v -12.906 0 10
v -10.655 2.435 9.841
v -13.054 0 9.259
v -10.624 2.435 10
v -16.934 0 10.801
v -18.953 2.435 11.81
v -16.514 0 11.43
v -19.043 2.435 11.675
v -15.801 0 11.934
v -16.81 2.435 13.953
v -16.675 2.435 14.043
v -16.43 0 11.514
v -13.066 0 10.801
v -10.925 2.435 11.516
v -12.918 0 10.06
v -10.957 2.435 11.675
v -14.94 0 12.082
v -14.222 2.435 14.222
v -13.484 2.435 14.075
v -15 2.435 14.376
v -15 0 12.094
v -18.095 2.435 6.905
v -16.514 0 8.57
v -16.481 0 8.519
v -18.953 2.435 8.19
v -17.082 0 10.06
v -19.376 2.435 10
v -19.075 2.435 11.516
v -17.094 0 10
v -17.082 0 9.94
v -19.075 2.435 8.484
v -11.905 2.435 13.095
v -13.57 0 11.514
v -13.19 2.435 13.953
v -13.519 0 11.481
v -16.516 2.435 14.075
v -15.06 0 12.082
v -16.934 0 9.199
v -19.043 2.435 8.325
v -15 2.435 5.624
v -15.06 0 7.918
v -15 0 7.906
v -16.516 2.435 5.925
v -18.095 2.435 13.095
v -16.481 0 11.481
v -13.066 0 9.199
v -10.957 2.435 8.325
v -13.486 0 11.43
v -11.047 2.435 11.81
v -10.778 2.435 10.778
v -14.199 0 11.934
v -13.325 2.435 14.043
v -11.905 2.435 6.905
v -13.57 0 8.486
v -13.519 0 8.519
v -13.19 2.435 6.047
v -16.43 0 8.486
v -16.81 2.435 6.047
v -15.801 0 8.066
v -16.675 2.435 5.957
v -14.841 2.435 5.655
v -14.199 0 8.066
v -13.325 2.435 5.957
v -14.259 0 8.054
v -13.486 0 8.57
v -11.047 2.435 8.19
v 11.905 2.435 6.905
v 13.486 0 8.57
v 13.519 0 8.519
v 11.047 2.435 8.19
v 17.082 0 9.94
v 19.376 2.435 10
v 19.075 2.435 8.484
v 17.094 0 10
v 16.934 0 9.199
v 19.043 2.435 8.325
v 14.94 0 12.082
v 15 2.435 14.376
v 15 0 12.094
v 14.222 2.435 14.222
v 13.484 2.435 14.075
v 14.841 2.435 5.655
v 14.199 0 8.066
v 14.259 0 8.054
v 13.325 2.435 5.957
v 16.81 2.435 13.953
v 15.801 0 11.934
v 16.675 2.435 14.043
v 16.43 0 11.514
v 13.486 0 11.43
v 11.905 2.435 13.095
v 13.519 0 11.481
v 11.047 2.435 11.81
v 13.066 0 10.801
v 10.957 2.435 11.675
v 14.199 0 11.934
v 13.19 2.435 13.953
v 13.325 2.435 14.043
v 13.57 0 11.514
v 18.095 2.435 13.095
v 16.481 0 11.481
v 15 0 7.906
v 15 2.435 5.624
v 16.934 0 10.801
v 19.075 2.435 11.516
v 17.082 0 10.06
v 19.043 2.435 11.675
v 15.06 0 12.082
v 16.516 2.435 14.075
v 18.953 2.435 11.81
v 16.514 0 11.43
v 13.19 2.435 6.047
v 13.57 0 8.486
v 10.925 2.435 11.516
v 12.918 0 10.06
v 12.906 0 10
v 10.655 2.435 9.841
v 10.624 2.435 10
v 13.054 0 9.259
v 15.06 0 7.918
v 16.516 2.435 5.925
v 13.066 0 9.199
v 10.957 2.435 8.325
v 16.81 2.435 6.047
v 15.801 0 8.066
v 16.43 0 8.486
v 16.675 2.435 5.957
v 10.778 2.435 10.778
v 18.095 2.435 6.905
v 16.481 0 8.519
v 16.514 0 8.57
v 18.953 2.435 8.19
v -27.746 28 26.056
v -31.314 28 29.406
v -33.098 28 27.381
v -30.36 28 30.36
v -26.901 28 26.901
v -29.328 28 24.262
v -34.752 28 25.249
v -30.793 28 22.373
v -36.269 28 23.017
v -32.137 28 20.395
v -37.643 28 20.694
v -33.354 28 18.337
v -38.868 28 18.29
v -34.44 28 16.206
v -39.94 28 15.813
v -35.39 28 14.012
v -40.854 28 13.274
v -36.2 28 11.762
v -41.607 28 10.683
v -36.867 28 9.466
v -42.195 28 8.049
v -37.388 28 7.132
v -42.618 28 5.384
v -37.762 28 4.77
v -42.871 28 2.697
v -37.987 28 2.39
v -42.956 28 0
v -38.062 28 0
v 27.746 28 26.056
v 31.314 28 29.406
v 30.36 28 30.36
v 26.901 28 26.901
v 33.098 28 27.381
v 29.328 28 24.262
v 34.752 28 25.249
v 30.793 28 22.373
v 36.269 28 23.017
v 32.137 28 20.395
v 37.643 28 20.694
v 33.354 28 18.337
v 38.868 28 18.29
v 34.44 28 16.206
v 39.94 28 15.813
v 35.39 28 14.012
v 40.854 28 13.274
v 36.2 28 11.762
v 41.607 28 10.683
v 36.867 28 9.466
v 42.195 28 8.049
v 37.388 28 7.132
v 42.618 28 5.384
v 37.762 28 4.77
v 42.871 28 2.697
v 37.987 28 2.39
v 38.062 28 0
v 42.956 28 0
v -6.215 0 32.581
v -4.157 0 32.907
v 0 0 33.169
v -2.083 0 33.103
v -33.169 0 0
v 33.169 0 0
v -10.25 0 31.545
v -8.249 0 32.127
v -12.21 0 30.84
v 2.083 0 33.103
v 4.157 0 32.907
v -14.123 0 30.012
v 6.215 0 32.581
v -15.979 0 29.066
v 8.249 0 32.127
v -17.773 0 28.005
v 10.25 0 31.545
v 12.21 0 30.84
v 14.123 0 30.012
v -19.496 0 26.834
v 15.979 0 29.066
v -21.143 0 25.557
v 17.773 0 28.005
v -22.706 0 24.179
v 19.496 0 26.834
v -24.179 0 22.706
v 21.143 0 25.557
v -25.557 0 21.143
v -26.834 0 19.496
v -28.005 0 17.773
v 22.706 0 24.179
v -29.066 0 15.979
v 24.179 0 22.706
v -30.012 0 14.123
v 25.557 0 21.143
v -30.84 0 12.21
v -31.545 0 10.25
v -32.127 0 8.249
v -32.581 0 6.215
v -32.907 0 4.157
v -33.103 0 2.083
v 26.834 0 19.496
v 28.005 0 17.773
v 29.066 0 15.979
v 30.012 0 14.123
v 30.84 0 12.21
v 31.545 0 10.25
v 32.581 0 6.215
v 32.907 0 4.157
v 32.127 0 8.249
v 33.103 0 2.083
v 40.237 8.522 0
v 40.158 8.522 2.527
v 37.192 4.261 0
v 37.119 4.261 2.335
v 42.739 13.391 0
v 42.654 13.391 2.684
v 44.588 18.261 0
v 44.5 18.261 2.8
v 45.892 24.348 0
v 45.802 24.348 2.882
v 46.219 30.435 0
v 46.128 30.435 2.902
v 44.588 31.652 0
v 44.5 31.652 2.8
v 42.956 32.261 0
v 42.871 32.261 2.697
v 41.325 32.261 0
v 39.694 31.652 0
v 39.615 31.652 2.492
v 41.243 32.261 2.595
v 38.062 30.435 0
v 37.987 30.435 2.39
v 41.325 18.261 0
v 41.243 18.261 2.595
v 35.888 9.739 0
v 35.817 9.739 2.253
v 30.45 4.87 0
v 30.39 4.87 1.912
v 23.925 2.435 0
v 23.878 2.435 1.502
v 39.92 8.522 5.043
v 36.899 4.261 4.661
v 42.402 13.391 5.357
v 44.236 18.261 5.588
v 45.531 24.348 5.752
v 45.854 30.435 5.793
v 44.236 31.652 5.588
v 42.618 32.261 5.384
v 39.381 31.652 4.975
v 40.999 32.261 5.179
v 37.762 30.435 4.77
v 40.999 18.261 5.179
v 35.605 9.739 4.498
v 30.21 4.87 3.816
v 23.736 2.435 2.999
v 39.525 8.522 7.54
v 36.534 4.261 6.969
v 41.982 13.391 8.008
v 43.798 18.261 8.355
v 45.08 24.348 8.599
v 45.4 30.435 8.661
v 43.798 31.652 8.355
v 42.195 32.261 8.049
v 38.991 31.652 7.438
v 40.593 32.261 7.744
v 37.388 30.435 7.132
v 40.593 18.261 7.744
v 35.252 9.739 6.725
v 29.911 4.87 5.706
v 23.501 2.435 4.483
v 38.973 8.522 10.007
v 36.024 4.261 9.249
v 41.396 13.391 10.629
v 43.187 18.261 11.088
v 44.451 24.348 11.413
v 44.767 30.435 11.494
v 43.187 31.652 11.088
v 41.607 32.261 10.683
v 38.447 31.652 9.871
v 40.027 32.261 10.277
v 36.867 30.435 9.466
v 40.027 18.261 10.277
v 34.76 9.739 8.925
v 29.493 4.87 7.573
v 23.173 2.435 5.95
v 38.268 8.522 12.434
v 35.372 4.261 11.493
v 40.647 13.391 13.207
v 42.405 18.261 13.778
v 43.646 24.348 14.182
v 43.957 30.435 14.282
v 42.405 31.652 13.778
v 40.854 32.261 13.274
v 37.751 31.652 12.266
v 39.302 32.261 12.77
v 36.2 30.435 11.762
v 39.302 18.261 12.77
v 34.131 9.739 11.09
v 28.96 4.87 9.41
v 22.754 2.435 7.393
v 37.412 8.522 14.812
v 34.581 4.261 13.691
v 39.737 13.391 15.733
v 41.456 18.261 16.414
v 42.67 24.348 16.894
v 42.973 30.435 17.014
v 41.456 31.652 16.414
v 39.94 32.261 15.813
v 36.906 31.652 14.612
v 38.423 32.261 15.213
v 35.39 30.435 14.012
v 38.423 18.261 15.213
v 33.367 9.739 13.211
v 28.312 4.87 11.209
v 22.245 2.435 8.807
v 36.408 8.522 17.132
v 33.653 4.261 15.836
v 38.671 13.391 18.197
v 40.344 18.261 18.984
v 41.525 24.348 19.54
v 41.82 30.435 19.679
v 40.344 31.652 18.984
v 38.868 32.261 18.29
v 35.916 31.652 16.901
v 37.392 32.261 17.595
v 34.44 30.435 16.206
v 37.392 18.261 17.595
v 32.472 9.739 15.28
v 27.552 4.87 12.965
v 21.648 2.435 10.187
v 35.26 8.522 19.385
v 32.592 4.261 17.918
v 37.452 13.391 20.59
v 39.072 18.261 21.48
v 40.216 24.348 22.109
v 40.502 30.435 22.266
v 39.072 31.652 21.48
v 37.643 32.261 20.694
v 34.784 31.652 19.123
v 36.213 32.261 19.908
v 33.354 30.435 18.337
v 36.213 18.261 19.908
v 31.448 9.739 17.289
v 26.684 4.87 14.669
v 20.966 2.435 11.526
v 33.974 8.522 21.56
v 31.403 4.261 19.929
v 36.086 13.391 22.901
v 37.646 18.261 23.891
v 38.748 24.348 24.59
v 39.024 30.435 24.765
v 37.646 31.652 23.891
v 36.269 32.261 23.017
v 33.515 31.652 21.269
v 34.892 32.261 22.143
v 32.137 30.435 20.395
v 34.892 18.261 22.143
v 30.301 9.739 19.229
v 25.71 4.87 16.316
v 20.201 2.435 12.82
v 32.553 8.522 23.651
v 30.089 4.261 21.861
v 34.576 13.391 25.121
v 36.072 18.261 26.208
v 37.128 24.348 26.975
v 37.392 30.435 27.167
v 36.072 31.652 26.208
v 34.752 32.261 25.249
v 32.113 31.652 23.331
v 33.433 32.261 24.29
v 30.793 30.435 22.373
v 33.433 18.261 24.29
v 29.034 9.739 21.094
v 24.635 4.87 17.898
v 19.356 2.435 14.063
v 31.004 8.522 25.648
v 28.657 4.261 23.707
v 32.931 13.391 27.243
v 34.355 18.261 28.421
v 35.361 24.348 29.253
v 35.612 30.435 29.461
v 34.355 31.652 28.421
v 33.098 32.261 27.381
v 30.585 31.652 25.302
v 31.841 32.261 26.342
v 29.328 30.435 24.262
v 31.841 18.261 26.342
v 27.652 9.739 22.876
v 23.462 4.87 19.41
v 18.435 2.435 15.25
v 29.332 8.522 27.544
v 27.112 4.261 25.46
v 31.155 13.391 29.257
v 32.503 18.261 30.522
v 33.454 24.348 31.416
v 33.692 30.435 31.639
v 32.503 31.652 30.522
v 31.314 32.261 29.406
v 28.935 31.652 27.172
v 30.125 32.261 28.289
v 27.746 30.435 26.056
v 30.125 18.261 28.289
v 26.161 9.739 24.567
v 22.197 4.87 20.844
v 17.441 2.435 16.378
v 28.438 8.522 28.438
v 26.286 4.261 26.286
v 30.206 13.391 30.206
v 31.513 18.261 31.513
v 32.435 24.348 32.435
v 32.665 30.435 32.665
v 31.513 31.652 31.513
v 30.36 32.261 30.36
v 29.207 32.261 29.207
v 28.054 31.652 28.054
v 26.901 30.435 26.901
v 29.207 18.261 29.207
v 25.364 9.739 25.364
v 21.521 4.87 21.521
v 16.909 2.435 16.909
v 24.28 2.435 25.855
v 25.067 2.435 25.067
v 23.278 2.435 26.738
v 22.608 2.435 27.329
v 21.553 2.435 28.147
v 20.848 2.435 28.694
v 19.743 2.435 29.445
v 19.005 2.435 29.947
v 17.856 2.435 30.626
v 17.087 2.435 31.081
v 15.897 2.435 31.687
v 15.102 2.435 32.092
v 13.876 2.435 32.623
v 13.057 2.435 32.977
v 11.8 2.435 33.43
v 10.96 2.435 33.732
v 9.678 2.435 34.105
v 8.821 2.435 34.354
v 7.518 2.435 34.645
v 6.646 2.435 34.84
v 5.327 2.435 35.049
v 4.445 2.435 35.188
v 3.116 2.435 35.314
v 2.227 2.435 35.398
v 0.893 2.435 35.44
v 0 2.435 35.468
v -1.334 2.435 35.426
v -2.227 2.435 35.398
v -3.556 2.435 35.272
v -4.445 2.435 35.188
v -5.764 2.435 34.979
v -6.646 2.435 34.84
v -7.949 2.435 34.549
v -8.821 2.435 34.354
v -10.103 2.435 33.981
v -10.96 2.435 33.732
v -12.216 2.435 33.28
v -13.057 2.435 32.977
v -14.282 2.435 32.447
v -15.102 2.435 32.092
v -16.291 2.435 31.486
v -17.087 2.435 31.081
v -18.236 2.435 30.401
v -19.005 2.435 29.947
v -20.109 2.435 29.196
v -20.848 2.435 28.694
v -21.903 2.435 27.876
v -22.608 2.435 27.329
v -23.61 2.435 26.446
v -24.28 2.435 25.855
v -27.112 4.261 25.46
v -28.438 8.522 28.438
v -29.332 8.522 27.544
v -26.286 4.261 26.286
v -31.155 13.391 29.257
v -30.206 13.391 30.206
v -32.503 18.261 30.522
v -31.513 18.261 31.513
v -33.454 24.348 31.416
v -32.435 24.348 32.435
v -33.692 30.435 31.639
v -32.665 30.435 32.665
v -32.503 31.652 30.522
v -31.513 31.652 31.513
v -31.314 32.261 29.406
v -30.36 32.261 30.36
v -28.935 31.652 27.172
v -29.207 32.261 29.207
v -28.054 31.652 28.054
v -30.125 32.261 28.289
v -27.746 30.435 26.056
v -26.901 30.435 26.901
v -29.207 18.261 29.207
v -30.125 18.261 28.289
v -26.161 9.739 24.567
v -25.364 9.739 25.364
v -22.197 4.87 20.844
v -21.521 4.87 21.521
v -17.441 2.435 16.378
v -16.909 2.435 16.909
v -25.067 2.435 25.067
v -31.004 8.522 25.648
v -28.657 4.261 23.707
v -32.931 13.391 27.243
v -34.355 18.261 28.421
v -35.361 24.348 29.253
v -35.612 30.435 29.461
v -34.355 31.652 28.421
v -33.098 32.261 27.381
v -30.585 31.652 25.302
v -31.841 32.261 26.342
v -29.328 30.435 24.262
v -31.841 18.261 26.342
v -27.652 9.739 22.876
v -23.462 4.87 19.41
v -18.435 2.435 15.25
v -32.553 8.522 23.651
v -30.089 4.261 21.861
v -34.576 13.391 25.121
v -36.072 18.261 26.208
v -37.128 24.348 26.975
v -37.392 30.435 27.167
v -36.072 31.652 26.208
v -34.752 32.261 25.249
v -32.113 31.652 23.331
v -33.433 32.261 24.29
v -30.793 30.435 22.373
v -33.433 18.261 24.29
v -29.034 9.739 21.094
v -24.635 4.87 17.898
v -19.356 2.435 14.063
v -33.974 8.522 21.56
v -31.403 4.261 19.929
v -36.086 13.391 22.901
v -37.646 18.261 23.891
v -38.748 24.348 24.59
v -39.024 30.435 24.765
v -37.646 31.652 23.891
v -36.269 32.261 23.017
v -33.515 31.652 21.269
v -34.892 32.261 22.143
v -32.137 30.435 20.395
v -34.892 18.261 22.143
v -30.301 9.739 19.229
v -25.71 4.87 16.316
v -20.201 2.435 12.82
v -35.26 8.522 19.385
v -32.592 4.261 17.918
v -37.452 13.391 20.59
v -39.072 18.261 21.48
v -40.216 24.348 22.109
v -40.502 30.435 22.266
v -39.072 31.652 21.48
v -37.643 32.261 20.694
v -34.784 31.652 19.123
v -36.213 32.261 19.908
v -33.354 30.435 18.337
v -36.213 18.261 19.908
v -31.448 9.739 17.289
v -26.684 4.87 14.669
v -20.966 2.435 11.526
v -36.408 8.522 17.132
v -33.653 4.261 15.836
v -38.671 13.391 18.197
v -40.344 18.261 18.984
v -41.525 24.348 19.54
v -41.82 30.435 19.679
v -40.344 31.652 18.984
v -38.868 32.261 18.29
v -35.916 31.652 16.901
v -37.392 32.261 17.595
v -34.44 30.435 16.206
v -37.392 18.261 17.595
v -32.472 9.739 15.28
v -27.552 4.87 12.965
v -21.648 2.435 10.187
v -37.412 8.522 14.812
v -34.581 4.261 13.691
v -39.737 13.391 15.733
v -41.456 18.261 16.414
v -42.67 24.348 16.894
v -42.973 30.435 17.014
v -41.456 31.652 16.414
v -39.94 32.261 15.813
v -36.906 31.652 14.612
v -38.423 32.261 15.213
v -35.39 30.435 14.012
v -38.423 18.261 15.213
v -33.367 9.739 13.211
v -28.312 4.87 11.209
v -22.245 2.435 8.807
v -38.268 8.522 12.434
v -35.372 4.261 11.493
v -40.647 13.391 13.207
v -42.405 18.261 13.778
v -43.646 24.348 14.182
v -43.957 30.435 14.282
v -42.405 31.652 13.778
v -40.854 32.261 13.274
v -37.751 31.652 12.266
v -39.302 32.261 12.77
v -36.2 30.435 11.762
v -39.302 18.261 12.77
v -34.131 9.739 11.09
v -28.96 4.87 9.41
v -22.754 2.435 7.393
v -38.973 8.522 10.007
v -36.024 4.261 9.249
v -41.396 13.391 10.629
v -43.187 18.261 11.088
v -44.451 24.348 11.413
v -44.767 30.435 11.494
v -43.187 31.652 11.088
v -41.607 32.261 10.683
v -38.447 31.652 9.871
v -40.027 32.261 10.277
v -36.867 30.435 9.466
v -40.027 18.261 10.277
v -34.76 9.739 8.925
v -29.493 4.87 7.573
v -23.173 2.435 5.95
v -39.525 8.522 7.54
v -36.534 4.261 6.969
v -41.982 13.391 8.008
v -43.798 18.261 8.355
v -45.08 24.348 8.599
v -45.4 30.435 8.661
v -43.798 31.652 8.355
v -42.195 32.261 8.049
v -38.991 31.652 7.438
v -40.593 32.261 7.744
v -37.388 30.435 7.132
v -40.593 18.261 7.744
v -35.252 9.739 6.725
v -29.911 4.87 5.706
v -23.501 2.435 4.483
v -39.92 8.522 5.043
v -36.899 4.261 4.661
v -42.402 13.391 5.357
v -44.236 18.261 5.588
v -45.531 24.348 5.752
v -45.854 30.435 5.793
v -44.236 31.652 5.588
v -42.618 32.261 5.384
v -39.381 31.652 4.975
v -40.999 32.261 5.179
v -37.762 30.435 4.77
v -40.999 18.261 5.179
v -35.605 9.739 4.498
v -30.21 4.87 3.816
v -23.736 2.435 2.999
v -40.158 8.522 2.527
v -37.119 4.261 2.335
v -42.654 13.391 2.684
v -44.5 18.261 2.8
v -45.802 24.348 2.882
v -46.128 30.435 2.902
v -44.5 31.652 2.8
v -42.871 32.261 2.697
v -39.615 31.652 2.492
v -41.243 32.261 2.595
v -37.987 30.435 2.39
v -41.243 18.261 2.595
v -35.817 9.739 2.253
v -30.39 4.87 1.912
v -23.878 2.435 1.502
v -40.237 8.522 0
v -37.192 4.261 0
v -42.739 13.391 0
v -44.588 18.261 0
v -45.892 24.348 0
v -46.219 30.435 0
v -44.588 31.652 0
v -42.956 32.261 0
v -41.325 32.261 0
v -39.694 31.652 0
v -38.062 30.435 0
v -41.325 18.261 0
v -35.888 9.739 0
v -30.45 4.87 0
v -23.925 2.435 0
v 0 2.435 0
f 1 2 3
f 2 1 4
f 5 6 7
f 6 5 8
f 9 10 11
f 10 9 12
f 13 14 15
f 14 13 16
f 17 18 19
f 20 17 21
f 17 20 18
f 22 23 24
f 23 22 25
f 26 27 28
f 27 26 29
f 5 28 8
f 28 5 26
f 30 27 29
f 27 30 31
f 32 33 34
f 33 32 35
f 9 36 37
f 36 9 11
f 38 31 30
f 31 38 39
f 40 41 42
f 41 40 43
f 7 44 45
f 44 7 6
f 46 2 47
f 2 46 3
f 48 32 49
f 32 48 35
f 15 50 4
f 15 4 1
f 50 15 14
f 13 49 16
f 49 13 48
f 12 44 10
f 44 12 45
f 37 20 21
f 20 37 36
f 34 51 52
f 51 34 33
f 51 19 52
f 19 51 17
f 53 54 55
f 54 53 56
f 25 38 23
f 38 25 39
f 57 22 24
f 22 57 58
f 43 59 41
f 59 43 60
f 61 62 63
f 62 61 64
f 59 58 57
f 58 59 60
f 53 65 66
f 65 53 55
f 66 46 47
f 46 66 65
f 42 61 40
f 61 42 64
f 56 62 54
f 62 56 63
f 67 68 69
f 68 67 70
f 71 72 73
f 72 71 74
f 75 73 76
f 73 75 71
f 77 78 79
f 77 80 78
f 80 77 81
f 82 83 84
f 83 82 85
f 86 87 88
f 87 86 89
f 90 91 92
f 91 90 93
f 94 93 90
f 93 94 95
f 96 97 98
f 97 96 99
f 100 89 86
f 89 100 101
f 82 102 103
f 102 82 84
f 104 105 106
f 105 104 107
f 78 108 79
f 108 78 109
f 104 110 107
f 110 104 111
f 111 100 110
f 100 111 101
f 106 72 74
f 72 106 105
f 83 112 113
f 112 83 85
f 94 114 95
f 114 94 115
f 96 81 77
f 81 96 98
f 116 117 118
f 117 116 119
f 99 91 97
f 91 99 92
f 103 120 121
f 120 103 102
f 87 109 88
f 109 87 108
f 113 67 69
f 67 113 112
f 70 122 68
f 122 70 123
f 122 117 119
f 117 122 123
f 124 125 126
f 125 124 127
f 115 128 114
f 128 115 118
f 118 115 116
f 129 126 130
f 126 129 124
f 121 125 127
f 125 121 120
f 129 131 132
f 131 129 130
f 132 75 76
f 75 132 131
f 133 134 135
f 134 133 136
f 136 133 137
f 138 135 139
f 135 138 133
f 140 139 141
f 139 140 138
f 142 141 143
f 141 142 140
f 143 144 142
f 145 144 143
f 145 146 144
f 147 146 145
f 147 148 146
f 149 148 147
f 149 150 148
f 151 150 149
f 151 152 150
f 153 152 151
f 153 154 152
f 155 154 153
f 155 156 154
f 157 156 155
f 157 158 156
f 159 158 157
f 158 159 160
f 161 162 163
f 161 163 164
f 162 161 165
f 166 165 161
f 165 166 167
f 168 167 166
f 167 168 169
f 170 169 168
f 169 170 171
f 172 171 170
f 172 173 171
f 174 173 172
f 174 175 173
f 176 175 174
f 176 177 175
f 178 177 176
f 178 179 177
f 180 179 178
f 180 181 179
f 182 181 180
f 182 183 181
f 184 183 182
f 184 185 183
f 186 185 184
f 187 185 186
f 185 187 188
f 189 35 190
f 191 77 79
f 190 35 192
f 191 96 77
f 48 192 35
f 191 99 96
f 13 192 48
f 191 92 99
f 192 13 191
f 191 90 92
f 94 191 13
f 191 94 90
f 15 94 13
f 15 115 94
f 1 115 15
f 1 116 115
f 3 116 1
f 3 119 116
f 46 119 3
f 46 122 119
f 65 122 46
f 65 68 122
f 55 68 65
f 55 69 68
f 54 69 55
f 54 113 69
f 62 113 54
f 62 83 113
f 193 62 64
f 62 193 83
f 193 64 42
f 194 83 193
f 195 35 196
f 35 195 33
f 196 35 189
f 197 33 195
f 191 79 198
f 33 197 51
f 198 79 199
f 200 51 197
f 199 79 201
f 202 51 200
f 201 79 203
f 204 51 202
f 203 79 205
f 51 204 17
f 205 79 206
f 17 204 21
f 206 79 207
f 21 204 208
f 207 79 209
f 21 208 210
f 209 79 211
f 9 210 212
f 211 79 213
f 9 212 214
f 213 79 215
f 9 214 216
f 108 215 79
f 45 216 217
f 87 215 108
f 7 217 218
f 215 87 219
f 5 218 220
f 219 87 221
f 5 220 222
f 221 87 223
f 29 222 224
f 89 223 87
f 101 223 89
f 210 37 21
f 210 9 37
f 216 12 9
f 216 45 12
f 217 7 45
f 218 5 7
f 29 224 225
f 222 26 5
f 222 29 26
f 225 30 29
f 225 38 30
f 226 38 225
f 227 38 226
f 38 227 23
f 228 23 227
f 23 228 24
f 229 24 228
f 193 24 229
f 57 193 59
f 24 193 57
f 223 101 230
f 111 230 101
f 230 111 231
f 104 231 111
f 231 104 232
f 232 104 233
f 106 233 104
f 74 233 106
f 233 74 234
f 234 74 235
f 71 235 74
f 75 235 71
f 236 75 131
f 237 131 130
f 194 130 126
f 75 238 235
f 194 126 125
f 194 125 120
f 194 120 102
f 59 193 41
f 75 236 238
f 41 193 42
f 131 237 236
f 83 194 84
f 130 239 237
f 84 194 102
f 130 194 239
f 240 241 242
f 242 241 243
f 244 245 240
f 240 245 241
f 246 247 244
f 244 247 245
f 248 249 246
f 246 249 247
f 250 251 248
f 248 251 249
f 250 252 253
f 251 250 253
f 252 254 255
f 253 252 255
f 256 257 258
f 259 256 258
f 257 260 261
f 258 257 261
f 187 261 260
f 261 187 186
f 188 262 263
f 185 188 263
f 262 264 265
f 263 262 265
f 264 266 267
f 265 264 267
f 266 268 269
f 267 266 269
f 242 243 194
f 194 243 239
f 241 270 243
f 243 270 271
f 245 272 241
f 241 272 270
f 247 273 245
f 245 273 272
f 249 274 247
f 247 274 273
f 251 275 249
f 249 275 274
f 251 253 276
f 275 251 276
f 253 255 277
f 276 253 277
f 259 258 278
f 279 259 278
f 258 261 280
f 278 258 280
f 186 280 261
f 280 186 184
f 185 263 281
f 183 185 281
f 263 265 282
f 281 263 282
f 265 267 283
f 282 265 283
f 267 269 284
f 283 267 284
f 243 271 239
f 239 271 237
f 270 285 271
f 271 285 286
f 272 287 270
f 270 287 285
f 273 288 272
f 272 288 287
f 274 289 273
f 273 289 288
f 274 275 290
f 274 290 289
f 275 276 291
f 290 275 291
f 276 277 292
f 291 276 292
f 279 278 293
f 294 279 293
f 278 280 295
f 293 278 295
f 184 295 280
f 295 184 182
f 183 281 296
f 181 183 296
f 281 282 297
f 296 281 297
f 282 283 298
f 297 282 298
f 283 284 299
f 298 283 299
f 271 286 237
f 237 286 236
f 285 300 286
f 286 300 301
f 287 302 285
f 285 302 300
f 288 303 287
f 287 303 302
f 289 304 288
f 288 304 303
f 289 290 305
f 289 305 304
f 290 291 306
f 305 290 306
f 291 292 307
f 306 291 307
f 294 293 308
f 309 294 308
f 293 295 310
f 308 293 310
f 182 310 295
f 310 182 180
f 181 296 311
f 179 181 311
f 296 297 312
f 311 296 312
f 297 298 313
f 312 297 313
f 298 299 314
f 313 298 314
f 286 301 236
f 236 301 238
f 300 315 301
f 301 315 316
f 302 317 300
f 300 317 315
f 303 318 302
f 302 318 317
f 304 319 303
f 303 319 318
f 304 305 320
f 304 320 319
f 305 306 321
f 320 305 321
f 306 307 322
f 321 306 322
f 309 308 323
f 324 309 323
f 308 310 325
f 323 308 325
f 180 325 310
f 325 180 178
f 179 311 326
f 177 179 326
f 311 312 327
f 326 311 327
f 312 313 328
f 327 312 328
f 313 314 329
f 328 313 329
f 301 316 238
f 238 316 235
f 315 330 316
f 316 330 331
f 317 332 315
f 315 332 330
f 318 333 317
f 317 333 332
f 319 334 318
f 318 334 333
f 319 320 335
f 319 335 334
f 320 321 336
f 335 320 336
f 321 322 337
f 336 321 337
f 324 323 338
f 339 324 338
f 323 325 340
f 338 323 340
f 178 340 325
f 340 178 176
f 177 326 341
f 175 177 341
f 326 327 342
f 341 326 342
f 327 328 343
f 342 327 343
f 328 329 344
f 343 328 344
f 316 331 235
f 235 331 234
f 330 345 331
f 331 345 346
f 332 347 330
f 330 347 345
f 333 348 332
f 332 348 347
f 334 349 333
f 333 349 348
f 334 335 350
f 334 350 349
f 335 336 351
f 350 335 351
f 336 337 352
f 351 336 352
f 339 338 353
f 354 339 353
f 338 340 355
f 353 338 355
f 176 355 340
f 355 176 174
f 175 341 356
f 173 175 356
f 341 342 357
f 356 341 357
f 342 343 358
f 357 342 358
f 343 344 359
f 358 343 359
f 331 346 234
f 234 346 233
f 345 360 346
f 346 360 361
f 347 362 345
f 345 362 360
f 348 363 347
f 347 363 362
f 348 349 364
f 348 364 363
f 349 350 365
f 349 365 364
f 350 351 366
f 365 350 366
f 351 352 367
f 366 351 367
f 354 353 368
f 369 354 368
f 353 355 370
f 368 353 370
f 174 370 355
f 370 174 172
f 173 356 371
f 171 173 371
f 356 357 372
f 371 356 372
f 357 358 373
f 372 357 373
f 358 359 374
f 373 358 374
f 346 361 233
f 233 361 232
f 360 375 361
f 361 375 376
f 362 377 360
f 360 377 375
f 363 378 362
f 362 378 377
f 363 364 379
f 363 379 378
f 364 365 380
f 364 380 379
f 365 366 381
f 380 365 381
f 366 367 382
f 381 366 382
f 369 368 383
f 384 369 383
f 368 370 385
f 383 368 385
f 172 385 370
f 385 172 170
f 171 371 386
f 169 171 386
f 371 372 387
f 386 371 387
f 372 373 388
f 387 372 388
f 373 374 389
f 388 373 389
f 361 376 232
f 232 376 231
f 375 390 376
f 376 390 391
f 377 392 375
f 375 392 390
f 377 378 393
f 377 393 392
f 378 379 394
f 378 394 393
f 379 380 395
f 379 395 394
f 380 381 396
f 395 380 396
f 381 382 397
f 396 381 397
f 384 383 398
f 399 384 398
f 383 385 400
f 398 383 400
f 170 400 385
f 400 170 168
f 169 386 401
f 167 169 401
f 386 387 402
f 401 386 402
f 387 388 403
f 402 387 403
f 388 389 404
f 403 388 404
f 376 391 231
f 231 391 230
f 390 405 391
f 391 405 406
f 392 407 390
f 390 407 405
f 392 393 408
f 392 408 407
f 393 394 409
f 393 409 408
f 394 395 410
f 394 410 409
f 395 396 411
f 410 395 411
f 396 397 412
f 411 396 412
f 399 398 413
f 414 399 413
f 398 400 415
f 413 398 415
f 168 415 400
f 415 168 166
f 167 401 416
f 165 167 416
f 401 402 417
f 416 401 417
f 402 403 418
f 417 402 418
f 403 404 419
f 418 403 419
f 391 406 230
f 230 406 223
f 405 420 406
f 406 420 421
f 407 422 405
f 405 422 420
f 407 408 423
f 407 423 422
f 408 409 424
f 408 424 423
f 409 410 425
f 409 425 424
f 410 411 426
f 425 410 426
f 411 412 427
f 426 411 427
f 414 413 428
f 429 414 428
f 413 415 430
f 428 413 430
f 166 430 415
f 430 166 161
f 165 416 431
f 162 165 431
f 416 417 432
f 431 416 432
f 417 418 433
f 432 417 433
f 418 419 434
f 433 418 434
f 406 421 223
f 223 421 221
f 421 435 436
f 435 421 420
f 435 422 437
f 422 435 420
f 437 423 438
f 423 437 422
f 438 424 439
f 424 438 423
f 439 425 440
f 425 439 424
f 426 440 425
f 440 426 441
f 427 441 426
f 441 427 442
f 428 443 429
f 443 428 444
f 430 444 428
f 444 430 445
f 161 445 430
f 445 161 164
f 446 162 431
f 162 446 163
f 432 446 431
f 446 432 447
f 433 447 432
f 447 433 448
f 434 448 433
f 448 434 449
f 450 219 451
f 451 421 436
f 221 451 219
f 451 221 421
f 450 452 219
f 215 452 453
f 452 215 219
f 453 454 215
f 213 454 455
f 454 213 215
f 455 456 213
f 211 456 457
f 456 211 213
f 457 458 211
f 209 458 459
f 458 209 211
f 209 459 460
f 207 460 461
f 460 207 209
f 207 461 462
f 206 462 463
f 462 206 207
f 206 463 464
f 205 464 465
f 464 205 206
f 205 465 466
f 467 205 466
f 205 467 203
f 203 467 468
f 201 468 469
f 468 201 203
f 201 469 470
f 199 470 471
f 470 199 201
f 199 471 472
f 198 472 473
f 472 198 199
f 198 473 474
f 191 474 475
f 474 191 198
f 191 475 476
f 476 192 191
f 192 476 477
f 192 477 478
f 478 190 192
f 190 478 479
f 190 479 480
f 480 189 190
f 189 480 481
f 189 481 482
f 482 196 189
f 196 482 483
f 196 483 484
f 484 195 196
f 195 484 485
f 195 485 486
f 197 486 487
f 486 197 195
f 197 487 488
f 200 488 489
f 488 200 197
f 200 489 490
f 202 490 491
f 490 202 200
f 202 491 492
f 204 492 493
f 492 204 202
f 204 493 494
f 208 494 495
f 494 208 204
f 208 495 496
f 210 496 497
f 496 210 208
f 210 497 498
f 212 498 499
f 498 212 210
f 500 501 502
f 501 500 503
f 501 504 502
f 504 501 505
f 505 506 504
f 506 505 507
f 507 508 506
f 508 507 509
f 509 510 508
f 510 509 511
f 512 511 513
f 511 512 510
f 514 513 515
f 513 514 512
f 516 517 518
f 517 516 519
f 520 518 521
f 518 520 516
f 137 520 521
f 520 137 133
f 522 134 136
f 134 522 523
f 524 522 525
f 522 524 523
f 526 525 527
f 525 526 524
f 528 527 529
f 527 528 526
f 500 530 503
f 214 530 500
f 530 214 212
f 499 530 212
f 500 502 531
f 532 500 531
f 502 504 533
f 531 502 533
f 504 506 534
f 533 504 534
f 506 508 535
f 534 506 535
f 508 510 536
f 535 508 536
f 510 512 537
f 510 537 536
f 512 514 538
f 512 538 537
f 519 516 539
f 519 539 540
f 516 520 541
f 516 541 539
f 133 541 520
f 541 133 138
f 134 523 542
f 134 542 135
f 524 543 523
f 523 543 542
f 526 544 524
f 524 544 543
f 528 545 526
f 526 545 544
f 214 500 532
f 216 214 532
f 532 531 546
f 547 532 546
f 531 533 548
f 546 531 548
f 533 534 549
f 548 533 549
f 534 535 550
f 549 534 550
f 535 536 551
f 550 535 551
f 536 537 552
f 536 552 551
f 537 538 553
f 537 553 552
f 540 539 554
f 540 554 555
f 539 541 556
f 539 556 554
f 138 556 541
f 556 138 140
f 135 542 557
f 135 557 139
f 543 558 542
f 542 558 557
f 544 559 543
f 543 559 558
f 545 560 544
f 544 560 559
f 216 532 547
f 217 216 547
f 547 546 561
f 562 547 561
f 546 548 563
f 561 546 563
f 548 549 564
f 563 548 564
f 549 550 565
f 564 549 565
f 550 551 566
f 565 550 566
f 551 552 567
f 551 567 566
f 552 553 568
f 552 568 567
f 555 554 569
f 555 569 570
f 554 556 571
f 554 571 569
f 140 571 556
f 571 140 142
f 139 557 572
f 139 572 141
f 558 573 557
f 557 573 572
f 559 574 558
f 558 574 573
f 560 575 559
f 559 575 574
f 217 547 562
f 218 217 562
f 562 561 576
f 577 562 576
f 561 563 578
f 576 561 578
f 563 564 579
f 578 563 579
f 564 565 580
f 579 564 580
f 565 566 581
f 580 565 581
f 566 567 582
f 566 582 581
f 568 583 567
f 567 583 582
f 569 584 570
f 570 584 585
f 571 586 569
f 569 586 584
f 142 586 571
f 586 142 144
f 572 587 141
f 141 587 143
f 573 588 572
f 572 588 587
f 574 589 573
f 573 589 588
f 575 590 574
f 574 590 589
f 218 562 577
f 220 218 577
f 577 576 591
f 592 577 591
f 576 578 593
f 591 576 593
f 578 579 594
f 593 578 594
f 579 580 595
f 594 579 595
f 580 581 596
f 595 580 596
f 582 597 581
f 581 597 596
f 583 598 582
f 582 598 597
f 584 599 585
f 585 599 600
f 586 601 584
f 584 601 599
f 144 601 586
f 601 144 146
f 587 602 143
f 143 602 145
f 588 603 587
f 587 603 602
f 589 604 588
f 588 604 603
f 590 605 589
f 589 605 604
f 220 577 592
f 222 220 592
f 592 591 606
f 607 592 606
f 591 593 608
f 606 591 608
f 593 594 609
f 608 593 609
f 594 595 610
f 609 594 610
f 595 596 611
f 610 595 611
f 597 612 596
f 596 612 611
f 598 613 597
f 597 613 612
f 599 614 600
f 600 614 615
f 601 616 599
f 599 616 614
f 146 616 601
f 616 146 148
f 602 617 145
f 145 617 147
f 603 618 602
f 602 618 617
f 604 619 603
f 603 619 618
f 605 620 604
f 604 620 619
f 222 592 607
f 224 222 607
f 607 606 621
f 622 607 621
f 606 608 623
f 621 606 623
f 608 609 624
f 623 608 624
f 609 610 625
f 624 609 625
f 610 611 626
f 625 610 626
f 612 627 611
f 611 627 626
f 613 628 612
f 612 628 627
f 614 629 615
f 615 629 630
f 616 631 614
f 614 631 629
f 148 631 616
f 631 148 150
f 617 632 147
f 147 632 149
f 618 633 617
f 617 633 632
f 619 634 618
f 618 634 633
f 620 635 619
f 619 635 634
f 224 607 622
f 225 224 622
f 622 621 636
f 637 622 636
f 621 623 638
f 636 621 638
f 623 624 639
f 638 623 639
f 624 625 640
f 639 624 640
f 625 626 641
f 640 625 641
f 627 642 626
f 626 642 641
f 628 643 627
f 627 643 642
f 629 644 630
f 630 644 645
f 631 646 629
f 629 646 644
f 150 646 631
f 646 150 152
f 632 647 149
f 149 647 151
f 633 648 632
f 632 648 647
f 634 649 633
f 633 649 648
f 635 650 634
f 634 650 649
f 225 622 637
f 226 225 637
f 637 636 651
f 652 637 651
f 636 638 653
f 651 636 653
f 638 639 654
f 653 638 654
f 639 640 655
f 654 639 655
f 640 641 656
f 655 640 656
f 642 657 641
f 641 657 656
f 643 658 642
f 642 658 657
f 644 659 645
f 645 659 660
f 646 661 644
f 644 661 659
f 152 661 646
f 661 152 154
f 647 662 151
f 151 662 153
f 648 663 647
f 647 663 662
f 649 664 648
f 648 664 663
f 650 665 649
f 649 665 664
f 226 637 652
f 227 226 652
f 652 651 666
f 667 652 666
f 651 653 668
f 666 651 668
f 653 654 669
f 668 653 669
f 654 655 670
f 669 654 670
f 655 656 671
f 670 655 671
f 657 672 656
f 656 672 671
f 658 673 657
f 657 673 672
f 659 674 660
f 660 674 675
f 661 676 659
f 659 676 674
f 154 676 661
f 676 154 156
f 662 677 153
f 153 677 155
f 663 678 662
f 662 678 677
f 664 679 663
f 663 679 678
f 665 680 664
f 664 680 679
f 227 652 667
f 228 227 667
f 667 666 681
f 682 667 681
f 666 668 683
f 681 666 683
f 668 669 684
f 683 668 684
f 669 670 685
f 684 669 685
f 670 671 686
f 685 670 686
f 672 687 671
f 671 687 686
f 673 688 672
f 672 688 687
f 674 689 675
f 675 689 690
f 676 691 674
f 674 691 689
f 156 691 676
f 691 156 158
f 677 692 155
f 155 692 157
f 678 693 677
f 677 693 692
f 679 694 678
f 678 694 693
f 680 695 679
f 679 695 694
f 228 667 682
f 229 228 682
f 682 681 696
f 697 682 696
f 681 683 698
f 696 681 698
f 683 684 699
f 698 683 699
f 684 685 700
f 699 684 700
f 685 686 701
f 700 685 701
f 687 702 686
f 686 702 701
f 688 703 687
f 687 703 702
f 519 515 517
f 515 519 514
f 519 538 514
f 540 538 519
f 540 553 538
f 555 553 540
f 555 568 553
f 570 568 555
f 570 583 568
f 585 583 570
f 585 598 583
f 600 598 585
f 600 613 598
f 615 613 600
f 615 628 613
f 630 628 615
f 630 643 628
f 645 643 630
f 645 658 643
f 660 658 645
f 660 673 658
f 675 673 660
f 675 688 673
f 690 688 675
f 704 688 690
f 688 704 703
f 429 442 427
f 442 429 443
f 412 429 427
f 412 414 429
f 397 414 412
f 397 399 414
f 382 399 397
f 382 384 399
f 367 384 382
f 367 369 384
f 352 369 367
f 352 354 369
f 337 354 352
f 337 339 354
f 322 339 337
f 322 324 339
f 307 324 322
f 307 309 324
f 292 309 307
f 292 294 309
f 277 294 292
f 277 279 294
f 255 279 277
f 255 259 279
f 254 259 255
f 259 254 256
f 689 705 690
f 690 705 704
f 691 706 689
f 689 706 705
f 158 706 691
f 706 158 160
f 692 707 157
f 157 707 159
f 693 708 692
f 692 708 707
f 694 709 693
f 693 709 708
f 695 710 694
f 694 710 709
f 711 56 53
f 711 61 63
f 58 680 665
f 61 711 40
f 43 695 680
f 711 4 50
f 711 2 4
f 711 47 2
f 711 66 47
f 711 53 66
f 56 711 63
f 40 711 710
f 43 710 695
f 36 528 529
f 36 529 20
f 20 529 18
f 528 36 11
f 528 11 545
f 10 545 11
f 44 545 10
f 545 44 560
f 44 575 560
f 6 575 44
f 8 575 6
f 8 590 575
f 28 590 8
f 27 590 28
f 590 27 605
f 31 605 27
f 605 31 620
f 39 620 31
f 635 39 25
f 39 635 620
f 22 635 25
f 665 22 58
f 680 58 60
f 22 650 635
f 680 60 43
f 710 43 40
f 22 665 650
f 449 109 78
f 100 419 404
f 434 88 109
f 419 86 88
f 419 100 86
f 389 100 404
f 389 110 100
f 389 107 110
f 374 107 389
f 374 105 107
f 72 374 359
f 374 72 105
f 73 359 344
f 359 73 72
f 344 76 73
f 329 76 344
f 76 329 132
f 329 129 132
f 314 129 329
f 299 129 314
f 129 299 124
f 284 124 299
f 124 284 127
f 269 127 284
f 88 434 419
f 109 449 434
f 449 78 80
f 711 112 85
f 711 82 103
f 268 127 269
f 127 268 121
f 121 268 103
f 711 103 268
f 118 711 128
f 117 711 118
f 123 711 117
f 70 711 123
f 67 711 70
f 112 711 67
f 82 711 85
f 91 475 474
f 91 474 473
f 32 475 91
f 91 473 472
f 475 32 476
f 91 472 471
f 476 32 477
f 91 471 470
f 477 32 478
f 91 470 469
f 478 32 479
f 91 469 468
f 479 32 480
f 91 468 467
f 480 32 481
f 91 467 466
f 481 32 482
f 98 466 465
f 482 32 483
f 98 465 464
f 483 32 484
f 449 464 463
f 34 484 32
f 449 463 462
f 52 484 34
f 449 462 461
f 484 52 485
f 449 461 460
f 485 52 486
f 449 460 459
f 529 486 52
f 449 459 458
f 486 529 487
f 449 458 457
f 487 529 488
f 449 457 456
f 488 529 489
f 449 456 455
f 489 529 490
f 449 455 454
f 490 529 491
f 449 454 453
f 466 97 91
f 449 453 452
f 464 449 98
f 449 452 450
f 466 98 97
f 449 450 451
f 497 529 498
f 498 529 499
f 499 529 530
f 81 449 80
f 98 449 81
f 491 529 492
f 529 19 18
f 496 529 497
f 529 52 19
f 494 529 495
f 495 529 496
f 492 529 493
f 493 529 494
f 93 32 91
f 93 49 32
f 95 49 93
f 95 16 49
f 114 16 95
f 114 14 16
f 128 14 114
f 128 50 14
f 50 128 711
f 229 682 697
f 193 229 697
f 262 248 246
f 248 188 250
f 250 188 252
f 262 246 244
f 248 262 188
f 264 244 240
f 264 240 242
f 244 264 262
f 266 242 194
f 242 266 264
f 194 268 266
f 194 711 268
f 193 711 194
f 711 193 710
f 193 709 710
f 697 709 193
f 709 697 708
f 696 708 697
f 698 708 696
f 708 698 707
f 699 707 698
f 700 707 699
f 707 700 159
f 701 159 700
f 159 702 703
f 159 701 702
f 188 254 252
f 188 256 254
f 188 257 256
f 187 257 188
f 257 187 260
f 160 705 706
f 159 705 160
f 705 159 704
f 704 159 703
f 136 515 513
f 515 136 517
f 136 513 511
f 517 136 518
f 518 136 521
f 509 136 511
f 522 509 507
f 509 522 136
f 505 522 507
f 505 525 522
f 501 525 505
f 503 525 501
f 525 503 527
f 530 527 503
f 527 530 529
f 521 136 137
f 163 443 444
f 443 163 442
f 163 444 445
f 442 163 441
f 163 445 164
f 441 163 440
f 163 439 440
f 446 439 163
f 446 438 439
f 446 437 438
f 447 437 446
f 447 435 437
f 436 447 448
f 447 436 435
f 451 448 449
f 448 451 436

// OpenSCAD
//Remote generation: 0 is for gen2, 1 is for gen3
gen=0; //[0:Generation2, 1:Generation3]

//Put in holes to mount with screws?
holes=1; //[0:no, 1:yes]

//Cut out the bottom to better reach the buttons
cut_bottom=1; //[0:no, 1:yes]

/* [Hidden] */

/*
HueHolder Gen2 and Gen3
Version 6, January 2015
Written by MC Geisler (mcgenki at gmail dot com)

A convenient storage for your remote control.

Have fun!

License: Attribution 4.0 International (CC BY 4.0)

You are free to:
    Share — copy and redistribute the material in any medium or format
    Adapt — remix, transform, and build upon the material
    for any purpose, even commercially.
*/


//to fix the scales so both remotes fit
scaleall=40/39.5;


//for scaling to gen2 remote (from gen3 remote)
//0 entry is radius and height of gen2 remote, 1 entry is for gen3 remote (original holder was for gen3)
rr=[43.5/scaleall,40];
zz=[28,23];

//for scaling to gen2 remote (from gen3 remote) if gen=0
scale_r=rr[gen]/rr[1]*scaleall;
scale_z=zz[gen]/zz[1];

rotate ([270,0,0])
{
  difference()
	{
		//original size gen3 hole: 40mm radius maximal, 23mm height
		//gen2 size: 42mm radius, 26mm height 
		//gen2 hole: 44mm radius, 28mm height

                echo ("Outer radius of remote:", 39.5*scale_r);
		scale([scale_r,scale_r,scale_z])
			rotate_extrude($fn=100) 
				polygon( points=[[0,0],[30.5,0],[34.2,3.5],[37,7],[39.3,11],[41,15],[42.2,20],[42.5,25],
					[41,26],[39.5,26.5],[38,26.5],[36.5,26],
					[35,25],[35,23],[39.5,23],[38,15],[33,8],[28,4],[22,2],[0,2]] );

		//cut off lower part
		translate([-90,0,-1]) 
			cube(size=[160,160,60], center=false);

		if (holes == 1)
                {       
                    //two holes for mounting
                    translate([-15,-10,-.1]) 
			cylinder(h=3.2, r1=2, r2=5);
                    translate([15,-10,-.1]) 
			cylinder(h=3.2, r1=2, r2=5);
                }
                
                if (cut_bottom==1)
                {
                    //cut off diagonally
                    translate([0,-rr[gen]*sqrt(2),rr[gen]+2*scale_z]) 
			rotate([0,0,45])
				cube(size=rr[gen]*2, center=true);
		}
  	}
};
